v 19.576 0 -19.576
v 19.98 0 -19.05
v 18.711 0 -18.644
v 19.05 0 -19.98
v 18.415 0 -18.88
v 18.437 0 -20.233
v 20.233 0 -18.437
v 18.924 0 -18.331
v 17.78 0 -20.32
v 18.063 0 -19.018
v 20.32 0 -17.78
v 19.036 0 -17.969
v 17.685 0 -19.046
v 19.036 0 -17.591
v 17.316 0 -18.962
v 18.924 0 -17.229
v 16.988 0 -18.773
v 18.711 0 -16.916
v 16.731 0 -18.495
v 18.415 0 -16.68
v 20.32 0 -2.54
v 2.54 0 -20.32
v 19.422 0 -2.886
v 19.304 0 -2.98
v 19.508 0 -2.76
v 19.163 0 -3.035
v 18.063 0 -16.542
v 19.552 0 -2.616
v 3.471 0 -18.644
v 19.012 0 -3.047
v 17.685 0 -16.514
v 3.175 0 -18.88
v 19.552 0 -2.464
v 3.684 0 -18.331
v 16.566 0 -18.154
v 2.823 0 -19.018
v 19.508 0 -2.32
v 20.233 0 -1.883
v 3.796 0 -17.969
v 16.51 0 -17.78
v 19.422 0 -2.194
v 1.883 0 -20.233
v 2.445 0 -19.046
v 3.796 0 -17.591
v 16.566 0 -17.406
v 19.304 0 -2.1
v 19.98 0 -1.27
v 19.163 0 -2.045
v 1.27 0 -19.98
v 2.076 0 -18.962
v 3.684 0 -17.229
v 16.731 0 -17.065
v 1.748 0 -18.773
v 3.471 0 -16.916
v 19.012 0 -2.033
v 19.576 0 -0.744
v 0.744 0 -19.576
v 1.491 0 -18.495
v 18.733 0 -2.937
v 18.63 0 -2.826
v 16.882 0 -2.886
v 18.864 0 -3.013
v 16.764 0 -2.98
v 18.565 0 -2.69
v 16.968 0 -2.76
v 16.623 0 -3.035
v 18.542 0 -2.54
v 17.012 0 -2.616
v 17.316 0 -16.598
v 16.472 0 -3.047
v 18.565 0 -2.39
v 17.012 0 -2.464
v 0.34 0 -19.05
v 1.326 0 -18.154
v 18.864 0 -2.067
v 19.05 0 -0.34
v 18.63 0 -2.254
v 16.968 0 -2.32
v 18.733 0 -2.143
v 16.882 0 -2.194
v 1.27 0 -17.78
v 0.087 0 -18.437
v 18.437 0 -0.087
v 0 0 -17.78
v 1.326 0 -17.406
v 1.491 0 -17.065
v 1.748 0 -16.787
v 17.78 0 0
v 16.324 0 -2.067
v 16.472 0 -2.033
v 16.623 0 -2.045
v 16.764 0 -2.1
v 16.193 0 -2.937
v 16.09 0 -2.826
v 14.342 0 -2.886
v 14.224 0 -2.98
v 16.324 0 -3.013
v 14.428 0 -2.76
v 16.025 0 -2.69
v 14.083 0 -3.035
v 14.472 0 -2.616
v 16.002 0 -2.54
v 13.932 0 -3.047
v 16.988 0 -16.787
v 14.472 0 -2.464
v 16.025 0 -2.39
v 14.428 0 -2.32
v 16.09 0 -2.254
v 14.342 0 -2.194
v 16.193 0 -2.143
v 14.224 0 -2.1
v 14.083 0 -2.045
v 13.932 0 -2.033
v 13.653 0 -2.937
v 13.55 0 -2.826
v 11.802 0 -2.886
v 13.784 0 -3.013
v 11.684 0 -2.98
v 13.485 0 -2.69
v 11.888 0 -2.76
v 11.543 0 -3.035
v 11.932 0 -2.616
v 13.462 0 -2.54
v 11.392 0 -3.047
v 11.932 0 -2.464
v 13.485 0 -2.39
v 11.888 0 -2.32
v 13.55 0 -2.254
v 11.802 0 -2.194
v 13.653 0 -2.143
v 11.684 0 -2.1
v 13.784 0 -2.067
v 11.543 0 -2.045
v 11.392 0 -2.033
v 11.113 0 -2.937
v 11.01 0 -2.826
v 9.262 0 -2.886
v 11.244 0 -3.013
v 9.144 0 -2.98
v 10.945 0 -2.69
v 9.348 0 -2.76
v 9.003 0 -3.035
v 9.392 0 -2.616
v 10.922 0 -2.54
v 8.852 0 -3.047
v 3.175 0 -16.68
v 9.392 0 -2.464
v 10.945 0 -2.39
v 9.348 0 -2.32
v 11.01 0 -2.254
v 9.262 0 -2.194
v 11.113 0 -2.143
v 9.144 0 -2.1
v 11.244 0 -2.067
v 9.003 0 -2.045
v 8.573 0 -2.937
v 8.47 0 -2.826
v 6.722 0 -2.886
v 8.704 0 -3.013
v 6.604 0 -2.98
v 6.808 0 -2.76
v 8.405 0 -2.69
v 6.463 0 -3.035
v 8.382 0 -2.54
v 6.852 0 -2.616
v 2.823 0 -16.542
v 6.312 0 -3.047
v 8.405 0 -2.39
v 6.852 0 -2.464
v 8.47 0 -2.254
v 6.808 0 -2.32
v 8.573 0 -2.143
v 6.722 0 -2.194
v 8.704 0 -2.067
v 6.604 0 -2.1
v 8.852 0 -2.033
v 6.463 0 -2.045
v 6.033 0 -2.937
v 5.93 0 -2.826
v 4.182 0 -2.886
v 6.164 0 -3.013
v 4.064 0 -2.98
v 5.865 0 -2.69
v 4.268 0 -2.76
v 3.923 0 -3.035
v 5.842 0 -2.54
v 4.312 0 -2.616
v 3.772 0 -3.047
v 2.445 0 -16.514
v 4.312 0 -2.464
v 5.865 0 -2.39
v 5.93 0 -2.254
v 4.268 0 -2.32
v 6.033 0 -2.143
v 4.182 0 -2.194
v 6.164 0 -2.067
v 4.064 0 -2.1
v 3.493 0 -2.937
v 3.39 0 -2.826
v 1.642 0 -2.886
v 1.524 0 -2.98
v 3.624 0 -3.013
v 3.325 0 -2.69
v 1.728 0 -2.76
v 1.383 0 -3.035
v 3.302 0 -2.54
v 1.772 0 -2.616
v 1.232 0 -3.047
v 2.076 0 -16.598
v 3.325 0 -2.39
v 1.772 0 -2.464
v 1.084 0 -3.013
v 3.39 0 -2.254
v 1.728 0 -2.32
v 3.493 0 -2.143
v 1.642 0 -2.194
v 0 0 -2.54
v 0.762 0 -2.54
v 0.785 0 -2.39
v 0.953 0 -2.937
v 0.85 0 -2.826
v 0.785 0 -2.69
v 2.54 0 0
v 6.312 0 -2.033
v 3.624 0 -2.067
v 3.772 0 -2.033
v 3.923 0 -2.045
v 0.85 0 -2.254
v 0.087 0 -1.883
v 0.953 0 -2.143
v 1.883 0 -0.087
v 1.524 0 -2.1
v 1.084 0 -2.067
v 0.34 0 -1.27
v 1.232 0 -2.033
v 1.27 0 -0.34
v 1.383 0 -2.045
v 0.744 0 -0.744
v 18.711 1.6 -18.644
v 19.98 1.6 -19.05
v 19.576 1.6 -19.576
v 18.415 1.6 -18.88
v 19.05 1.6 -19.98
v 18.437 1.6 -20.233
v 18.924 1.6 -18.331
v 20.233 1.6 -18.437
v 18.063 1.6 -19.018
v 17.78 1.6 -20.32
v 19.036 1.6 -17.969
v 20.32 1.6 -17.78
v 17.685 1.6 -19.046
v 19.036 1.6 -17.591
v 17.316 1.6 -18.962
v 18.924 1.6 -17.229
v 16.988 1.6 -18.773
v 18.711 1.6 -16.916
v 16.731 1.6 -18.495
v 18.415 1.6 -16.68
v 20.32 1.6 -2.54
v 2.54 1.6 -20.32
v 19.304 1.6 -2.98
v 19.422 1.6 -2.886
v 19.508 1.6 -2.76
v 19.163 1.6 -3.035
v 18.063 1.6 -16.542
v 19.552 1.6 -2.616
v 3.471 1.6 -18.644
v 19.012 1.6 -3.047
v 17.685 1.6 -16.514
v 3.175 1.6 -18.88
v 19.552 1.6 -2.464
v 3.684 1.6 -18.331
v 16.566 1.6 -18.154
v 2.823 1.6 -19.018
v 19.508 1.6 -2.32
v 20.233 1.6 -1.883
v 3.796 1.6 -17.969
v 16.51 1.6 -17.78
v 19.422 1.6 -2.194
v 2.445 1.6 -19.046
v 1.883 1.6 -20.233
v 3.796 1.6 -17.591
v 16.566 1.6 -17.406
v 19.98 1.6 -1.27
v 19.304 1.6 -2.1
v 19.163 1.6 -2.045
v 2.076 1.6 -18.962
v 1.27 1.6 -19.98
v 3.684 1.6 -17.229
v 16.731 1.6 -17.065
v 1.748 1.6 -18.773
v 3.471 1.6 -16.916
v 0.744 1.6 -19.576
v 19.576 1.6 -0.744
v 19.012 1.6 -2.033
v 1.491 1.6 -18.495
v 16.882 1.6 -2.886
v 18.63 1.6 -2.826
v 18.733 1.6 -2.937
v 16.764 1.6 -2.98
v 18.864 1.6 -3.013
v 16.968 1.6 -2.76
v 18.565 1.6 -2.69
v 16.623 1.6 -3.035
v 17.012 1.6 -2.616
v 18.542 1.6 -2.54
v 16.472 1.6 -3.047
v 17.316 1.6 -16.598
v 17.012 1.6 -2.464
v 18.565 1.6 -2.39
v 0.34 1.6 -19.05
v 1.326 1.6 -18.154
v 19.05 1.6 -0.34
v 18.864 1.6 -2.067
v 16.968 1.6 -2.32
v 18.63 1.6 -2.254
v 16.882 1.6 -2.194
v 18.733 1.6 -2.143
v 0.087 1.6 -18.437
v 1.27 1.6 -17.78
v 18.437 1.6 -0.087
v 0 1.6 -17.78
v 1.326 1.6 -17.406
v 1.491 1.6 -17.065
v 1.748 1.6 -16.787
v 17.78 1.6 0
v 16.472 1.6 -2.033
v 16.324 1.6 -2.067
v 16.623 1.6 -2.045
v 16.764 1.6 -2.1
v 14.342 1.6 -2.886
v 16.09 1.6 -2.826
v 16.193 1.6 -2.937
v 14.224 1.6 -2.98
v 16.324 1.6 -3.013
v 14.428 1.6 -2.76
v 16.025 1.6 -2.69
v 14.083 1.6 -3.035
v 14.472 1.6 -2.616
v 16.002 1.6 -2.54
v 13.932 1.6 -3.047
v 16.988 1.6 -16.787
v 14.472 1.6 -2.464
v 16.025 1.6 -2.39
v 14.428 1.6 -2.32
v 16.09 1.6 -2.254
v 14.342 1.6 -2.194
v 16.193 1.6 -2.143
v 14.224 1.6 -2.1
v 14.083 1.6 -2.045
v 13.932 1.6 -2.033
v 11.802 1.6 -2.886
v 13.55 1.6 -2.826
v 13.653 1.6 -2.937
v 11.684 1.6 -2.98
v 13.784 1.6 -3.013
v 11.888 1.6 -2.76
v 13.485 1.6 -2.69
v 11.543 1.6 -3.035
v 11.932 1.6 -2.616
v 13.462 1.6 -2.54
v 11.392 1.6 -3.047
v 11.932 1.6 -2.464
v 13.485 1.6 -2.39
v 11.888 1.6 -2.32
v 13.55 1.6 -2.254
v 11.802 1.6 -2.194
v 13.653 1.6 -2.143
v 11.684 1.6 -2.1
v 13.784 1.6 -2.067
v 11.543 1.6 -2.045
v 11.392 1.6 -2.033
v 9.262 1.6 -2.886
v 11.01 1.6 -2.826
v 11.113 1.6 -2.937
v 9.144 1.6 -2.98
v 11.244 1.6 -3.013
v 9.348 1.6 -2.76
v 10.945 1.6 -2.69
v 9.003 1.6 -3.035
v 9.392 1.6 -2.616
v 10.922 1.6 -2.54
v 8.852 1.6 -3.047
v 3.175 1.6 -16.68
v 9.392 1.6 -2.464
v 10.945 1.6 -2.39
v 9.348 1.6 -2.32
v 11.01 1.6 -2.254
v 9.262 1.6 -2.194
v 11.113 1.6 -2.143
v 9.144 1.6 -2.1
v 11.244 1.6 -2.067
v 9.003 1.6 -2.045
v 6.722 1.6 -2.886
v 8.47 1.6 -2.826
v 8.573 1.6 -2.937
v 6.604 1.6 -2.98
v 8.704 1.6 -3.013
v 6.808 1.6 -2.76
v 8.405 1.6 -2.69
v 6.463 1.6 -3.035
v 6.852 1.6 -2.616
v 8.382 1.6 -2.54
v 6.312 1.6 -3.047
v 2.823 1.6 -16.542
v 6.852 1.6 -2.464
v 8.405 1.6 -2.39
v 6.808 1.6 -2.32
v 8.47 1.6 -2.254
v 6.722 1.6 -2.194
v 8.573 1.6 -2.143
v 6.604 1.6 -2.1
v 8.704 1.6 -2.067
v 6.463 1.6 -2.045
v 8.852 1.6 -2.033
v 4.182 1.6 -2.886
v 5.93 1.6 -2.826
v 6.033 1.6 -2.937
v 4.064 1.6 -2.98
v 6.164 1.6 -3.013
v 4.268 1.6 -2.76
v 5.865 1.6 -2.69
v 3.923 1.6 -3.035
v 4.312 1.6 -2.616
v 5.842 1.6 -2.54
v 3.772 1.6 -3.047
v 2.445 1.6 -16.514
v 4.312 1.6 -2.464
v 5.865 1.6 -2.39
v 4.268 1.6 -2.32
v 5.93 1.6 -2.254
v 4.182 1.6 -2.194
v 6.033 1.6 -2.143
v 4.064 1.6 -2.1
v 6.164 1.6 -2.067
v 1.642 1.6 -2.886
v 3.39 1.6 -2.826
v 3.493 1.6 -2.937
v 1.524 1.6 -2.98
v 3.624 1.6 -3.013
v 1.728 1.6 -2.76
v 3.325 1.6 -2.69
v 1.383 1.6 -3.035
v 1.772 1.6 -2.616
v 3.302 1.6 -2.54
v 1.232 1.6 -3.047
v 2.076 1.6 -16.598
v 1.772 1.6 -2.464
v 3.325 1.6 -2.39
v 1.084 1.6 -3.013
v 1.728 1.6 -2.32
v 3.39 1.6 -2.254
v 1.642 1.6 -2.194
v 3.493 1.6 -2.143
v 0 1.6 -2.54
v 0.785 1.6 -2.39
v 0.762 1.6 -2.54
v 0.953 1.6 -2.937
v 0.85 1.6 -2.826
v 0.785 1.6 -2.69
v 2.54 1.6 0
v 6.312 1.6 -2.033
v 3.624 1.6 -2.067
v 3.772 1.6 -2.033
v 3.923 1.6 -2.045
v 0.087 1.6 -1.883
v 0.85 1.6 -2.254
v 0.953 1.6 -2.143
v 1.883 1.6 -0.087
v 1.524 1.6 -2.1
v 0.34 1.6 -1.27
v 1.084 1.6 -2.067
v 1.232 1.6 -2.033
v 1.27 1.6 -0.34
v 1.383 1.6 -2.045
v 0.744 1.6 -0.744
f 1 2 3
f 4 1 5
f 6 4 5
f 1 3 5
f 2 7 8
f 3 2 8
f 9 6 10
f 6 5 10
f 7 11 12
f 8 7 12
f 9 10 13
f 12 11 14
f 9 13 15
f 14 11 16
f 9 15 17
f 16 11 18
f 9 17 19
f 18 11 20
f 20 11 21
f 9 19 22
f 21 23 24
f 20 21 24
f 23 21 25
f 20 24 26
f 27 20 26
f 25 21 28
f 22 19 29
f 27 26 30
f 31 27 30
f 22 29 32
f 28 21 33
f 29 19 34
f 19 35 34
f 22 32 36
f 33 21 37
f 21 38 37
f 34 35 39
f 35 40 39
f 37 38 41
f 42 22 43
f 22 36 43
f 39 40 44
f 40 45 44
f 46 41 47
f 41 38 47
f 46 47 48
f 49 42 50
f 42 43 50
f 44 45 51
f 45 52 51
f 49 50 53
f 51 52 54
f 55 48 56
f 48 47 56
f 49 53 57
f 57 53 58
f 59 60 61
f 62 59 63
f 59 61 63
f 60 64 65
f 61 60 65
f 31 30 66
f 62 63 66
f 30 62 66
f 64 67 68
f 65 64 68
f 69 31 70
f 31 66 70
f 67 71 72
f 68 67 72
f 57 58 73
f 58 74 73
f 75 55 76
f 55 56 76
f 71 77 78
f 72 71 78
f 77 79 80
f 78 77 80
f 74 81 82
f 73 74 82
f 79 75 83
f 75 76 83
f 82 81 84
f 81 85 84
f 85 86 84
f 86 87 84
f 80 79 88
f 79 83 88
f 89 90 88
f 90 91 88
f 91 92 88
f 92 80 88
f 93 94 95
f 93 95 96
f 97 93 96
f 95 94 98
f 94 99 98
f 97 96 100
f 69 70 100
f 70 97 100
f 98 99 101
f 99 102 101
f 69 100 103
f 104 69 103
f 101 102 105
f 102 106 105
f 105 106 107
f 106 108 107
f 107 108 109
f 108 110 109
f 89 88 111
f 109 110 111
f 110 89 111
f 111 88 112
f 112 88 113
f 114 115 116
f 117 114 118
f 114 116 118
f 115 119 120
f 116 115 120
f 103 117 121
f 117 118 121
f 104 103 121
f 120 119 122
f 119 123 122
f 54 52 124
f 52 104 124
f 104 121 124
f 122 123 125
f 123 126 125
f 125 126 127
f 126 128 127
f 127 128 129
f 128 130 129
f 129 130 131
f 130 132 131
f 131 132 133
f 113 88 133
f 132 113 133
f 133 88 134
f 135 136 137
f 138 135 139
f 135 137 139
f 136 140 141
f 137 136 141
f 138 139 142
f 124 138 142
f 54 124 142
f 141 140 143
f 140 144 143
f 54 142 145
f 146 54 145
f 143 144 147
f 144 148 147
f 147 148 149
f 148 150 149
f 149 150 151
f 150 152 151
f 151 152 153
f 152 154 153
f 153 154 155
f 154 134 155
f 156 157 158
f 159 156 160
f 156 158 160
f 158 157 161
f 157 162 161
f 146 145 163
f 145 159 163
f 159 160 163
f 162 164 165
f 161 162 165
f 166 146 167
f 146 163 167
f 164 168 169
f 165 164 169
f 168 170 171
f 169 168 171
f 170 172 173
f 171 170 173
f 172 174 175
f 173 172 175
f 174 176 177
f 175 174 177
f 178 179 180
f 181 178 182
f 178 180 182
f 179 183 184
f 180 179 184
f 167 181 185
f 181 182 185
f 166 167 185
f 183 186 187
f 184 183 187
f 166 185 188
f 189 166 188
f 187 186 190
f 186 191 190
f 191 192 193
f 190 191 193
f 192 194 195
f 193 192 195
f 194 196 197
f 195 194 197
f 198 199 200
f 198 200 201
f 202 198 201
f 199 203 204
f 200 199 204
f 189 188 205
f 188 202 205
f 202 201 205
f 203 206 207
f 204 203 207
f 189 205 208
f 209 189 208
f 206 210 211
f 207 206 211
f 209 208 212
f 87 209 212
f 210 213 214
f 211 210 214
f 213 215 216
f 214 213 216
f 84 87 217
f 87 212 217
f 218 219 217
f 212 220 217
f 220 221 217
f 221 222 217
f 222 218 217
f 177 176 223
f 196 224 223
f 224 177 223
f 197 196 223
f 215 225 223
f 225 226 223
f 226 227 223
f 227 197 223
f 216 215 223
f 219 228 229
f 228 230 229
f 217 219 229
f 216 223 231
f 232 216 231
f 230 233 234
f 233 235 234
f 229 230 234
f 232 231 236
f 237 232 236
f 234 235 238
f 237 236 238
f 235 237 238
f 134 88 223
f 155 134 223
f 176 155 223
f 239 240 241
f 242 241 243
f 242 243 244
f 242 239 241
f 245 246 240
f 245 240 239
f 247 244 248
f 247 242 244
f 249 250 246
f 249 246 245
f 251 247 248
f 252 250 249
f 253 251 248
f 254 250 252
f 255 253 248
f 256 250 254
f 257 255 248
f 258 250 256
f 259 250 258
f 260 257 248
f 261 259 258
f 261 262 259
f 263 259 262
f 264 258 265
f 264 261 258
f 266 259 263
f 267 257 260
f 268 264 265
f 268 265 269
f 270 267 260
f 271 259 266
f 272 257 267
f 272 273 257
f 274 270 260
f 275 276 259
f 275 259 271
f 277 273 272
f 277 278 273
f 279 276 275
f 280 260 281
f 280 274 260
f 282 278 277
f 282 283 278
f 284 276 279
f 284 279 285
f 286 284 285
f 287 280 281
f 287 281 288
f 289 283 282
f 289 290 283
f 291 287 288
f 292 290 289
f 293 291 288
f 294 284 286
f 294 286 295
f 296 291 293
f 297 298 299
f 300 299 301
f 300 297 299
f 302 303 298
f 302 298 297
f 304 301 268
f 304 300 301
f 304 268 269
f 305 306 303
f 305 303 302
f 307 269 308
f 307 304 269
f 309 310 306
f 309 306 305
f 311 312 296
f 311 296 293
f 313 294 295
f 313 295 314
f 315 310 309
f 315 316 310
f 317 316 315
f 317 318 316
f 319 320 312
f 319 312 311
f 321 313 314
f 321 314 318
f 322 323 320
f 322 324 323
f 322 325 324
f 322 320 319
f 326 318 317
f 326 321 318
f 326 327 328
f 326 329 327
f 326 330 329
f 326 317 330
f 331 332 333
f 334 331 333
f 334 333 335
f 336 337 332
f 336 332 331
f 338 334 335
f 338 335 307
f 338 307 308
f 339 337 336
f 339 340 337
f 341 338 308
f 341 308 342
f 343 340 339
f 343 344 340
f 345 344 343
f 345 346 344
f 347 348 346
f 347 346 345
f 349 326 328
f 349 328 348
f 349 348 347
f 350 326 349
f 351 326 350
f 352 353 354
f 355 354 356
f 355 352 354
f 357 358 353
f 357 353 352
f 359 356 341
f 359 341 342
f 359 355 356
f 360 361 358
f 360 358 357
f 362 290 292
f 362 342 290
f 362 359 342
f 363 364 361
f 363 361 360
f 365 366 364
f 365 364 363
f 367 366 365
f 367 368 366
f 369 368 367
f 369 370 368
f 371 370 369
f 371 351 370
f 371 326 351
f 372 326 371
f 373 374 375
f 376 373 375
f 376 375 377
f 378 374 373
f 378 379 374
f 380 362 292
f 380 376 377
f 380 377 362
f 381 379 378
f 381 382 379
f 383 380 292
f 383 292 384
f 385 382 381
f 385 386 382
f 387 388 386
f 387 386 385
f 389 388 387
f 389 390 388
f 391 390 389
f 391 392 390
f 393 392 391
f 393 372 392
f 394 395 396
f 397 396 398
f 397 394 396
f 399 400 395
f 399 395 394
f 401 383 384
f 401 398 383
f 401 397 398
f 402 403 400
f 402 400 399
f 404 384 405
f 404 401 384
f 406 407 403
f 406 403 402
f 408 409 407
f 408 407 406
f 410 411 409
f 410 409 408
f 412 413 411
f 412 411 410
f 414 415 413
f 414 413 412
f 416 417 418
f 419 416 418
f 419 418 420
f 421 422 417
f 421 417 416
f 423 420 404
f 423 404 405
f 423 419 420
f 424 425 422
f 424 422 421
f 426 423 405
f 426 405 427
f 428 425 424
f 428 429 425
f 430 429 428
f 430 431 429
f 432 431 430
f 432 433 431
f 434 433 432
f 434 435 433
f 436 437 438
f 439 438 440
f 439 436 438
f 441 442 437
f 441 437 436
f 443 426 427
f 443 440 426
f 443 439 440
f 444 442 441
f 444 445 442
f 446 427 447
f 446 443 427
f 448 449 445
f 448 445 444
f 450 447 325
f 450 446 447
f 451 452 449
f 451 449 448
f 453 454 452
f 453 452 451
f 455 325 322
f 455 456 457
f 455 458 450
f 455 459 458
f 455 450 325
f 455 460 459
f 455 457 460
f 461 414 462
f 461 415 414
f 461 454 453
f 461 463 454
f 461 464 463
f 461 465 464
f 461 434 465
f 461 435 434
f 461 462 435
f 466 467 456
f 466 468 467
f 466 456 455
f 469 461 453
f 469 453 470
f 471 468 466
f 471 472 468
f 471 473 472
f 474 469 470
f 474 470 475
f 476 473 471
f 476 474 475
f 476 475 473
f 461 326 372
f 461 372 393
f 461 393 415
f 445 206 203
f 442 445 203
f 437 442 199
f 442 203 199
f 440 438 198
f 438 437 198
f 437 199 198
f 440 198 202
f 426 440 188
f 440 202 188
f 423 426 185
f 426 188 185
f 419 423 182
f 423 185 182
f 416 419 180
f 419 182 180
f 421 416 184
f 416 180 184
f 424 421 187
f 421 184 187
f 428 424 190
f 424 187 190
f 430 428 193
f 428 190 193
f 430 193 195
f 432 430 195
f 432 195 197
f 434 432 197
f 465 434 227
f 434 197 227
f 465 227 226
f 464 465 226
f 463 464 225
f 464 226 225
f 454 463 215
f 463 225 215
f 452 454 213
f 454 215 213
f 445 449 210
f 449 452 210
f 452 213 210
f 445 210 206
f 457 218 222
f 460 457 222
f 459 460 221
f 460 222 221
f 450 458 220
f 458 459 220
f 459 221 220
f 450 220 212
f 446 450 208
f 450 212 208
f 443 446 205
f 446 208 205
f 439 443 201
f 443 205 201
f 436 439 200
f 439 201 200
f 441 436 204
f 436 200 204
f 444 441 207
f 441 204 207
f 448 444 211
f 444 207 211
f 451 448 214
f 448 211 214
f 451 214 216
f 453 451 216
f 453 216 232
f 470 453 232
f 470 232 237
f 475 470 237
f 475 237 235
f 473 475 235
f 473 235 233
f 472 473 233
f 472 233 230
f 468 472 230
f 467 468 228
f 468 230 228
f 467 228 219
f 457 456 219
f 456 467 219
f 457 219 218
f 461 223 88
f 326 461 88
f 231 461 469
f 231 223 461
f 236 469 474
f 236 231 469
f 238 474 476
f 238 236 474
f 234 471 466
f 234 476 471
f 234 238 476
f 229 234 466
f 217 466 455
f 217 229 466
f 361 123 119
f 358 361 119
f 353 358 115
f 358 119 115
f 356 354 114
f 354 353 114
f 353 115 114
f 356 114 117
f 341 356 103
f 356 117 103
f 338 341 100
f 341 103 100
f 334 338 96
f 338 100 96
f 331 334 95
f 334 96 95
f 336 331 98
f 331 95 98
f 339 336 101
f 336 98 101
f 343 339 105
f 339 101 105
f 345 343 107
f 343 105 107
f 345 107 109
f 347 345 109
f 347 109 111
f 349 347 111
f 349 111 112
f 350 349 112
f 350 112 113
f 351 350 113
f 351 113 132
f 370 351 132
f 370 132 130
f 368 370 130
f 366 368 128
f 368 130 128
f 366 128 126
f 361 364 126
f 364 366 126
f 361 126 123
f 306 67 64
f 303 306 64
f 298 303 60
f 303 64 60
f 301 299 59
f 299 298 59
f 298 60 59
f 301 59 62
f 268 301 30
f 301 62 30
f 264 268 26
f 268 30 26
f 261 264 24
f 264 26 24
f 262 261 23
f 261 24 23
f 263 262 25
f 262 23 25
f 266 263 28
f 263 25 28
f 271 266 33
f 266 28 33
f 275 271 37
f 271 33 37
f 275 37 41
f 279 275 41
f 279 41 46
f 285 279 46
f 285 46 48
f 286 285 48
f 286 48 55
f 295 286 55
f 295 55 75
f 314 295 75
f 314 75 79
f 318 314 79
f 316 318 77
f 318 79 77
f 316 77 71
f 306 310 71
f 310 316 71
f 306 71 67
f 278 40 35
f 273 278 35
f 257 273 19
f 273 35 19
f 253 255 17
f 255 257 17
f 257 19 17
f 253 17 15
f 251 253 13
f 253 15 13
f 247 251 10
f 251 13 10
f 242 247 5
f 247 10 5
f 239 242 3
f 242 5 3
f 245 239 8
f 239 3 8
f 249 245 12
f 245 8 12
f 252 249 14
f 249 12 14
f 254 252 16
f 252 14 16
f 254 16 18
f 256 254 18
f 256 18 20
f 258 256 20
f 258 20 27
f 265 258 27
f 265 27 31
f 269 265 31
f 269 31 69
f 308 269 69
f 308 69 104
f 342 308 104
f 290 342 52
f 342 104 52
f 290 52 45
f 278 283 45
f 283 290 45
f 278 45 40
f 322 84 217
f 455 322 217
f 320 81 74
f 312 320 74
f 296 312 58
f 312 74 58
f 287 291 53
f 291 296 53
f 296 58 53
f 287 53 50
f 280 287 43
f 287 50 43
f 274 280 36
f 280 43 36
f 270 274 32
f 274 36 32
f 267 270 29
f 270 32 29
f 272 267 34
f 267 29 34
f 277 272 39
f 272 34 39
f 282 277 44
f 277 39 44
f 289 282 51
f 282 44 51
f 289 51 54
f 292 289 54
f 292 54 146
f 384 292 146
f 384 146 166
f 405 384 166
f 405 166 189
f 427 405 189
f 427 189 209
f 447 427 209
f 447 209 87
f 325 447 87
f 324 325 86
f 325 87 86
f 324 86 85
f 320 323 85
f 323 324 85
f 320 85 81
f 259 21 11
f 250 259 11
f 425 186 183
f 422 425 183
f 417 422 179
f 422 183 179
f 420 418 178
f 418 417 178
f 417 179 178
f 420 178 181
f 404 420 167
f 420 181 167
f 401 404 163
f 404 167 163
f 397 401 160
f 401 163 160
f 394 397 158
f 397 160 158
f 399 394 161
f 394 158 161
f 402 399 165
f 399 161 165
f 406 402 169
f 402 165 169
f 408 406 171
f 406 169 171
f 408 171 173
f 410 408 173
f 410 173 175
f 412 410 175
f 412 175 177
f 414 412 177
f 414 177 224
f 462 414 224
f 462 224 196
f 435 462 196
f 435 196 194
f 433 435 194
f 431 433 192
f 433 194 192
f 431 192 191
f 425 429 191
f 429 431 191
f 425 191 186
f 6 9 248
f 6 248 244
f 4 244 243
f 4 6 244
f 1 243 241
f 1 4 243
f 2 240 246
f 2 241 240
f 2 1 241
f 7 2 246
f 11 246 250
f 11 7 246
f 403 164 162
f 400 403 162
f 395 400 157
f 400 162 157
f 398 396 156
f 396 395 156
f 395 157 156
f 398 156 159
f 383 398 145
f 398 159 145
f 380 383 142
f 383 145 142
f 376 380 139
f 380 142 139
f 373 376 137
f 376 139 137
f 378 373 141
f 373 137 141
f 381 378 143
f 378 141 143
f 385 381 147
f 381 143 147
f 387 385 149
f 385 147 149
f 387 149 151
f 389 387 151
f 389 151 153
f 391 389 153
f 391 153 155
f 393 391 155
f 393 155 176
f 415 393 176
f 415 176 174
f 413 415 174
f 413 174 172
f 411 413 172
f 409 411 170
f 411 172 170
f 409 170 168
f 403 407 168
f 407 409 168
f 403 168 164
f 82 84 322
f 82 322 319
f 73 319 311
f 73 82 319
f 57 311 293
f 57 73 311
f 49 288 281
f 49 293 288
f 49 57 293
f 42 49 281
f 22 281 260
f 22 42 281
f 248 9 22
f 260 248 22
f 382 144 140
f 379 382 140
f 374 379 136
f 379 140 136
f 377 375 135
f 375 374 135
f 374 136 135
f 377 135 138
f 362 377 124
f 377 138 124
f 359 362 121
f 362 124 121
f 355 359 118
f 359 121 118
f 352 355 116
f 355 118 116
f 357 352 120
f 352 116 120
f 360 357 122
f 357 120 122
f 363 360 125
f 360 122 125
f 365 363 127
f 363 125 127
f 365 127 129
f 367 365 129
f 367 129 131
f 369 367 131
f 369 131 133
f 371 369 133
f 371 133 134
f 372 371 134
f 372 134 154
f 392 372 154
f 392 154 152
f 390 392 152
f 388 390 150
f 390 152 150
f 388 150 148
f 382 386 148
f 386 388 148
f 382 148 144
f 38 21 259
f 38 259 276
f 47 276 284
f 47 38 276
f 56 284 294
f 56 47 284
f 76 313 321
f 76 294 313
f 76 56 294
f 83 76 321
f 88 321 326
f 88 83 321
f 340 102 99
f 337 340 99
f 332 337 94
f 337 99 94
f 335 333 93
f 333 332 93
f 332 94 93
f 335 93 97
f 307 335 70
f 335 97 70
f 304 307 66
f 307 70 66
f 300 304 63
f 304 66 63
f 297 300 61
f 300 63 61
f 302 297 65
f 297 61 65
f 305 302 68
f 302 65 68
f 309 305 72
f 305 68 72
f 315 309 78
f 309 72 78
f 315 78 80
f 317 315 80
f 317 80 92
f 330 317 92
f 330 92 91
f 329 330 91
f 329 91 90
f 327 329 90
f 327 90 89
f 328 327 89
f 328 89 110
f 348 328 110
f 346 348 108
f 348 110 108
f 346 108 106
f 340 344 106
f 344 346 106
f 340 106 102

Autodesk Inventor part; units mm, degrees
ref_plane "YZ Plane" through (0, 0, 0) normal (1, 0, 0) x (0, 1, 0)
ref_plane "XZ Plane" through (0, 0, 0) normal (0, 1, 0) x (-1, 0, 0)
ref_plane "XY Plane" through (0, 0, 0) normal (0, 0, 1) x (1, 0, 0)
sketch "Sketch1" plane through (0, 0, 0) normal (0, 1, 0) x (-1, 0, 0)
  line L0 (-2.54, 0) -> (-17.78, 0)
  line L1 (-20.32, -2.54) -> (-20.32, -17.78)
  line L2 (-17.78, -20.32) -> (-2.54, -20.32)
  line L3 (0, -17.78) -> (0, -2.54)
  arc A0 (-2.54, -20.32) -> (0, -17.78) centre (-2.54, -17.78) ccw
  arc A1 (-20.32, -17.78) -> (-17.78, -20.32) centre (-17.78, -17.78) ccw
  arc A2 (-17.78, 0) -> (-20.32, -2.54) centre (-17.78, -2.54) ccw
  arc A3 (0, -2.54) -> (-2.54, 0) centre (-2.54, -2.54) ccw
  circle A4 centre (-2.54, -17.78) radius 1.27
  circle A5 centre (-17.78, -17.78) radius 1.27
  line L4 (0, -2.54) -> (-20.32, -2.54) construction
  circle A6 centre (-1.27, -2.54) radius 0.508
  circle A7 centre (-3.81, -2.54) radius 0.508
  circle A8 centre (-6.35, -2.54) radius 0.508
  circle A9 centre (-8.89, -2.54) radius 0.508
  circle A10 centre (-11.43, -2.54) radius 0.508
  circle A11 centre (-13.97, -2.54) radius 0.508
  circle A12 centre (-16.51, -2.54) radius 0.508
  circle A13 centre (-19.05, -2.54) radius 0.508
  point P0 (0, 0)
  point P1 (-20.32, -20.32)
  point P2 (-20.32, 0)
  point P3 (0, -20.32)
  dimension "d0" = 20.32
  dimension "d1" = 20.32
  dimension "d2" = 2.54
  dimension "d3" = 2.54
  dimension "d6" = 2.54
  dimension "d11" = 1.27
  dimension "d12" = 1.27
  dimension "d13" = 1.016
  dimension "d16" = 2.54
extrude "Extrusion1" add sketch "Sketch1" along normal blind 1.6
equation "\"d11\" = d12"
properties part number "LIS3DH footprint"
